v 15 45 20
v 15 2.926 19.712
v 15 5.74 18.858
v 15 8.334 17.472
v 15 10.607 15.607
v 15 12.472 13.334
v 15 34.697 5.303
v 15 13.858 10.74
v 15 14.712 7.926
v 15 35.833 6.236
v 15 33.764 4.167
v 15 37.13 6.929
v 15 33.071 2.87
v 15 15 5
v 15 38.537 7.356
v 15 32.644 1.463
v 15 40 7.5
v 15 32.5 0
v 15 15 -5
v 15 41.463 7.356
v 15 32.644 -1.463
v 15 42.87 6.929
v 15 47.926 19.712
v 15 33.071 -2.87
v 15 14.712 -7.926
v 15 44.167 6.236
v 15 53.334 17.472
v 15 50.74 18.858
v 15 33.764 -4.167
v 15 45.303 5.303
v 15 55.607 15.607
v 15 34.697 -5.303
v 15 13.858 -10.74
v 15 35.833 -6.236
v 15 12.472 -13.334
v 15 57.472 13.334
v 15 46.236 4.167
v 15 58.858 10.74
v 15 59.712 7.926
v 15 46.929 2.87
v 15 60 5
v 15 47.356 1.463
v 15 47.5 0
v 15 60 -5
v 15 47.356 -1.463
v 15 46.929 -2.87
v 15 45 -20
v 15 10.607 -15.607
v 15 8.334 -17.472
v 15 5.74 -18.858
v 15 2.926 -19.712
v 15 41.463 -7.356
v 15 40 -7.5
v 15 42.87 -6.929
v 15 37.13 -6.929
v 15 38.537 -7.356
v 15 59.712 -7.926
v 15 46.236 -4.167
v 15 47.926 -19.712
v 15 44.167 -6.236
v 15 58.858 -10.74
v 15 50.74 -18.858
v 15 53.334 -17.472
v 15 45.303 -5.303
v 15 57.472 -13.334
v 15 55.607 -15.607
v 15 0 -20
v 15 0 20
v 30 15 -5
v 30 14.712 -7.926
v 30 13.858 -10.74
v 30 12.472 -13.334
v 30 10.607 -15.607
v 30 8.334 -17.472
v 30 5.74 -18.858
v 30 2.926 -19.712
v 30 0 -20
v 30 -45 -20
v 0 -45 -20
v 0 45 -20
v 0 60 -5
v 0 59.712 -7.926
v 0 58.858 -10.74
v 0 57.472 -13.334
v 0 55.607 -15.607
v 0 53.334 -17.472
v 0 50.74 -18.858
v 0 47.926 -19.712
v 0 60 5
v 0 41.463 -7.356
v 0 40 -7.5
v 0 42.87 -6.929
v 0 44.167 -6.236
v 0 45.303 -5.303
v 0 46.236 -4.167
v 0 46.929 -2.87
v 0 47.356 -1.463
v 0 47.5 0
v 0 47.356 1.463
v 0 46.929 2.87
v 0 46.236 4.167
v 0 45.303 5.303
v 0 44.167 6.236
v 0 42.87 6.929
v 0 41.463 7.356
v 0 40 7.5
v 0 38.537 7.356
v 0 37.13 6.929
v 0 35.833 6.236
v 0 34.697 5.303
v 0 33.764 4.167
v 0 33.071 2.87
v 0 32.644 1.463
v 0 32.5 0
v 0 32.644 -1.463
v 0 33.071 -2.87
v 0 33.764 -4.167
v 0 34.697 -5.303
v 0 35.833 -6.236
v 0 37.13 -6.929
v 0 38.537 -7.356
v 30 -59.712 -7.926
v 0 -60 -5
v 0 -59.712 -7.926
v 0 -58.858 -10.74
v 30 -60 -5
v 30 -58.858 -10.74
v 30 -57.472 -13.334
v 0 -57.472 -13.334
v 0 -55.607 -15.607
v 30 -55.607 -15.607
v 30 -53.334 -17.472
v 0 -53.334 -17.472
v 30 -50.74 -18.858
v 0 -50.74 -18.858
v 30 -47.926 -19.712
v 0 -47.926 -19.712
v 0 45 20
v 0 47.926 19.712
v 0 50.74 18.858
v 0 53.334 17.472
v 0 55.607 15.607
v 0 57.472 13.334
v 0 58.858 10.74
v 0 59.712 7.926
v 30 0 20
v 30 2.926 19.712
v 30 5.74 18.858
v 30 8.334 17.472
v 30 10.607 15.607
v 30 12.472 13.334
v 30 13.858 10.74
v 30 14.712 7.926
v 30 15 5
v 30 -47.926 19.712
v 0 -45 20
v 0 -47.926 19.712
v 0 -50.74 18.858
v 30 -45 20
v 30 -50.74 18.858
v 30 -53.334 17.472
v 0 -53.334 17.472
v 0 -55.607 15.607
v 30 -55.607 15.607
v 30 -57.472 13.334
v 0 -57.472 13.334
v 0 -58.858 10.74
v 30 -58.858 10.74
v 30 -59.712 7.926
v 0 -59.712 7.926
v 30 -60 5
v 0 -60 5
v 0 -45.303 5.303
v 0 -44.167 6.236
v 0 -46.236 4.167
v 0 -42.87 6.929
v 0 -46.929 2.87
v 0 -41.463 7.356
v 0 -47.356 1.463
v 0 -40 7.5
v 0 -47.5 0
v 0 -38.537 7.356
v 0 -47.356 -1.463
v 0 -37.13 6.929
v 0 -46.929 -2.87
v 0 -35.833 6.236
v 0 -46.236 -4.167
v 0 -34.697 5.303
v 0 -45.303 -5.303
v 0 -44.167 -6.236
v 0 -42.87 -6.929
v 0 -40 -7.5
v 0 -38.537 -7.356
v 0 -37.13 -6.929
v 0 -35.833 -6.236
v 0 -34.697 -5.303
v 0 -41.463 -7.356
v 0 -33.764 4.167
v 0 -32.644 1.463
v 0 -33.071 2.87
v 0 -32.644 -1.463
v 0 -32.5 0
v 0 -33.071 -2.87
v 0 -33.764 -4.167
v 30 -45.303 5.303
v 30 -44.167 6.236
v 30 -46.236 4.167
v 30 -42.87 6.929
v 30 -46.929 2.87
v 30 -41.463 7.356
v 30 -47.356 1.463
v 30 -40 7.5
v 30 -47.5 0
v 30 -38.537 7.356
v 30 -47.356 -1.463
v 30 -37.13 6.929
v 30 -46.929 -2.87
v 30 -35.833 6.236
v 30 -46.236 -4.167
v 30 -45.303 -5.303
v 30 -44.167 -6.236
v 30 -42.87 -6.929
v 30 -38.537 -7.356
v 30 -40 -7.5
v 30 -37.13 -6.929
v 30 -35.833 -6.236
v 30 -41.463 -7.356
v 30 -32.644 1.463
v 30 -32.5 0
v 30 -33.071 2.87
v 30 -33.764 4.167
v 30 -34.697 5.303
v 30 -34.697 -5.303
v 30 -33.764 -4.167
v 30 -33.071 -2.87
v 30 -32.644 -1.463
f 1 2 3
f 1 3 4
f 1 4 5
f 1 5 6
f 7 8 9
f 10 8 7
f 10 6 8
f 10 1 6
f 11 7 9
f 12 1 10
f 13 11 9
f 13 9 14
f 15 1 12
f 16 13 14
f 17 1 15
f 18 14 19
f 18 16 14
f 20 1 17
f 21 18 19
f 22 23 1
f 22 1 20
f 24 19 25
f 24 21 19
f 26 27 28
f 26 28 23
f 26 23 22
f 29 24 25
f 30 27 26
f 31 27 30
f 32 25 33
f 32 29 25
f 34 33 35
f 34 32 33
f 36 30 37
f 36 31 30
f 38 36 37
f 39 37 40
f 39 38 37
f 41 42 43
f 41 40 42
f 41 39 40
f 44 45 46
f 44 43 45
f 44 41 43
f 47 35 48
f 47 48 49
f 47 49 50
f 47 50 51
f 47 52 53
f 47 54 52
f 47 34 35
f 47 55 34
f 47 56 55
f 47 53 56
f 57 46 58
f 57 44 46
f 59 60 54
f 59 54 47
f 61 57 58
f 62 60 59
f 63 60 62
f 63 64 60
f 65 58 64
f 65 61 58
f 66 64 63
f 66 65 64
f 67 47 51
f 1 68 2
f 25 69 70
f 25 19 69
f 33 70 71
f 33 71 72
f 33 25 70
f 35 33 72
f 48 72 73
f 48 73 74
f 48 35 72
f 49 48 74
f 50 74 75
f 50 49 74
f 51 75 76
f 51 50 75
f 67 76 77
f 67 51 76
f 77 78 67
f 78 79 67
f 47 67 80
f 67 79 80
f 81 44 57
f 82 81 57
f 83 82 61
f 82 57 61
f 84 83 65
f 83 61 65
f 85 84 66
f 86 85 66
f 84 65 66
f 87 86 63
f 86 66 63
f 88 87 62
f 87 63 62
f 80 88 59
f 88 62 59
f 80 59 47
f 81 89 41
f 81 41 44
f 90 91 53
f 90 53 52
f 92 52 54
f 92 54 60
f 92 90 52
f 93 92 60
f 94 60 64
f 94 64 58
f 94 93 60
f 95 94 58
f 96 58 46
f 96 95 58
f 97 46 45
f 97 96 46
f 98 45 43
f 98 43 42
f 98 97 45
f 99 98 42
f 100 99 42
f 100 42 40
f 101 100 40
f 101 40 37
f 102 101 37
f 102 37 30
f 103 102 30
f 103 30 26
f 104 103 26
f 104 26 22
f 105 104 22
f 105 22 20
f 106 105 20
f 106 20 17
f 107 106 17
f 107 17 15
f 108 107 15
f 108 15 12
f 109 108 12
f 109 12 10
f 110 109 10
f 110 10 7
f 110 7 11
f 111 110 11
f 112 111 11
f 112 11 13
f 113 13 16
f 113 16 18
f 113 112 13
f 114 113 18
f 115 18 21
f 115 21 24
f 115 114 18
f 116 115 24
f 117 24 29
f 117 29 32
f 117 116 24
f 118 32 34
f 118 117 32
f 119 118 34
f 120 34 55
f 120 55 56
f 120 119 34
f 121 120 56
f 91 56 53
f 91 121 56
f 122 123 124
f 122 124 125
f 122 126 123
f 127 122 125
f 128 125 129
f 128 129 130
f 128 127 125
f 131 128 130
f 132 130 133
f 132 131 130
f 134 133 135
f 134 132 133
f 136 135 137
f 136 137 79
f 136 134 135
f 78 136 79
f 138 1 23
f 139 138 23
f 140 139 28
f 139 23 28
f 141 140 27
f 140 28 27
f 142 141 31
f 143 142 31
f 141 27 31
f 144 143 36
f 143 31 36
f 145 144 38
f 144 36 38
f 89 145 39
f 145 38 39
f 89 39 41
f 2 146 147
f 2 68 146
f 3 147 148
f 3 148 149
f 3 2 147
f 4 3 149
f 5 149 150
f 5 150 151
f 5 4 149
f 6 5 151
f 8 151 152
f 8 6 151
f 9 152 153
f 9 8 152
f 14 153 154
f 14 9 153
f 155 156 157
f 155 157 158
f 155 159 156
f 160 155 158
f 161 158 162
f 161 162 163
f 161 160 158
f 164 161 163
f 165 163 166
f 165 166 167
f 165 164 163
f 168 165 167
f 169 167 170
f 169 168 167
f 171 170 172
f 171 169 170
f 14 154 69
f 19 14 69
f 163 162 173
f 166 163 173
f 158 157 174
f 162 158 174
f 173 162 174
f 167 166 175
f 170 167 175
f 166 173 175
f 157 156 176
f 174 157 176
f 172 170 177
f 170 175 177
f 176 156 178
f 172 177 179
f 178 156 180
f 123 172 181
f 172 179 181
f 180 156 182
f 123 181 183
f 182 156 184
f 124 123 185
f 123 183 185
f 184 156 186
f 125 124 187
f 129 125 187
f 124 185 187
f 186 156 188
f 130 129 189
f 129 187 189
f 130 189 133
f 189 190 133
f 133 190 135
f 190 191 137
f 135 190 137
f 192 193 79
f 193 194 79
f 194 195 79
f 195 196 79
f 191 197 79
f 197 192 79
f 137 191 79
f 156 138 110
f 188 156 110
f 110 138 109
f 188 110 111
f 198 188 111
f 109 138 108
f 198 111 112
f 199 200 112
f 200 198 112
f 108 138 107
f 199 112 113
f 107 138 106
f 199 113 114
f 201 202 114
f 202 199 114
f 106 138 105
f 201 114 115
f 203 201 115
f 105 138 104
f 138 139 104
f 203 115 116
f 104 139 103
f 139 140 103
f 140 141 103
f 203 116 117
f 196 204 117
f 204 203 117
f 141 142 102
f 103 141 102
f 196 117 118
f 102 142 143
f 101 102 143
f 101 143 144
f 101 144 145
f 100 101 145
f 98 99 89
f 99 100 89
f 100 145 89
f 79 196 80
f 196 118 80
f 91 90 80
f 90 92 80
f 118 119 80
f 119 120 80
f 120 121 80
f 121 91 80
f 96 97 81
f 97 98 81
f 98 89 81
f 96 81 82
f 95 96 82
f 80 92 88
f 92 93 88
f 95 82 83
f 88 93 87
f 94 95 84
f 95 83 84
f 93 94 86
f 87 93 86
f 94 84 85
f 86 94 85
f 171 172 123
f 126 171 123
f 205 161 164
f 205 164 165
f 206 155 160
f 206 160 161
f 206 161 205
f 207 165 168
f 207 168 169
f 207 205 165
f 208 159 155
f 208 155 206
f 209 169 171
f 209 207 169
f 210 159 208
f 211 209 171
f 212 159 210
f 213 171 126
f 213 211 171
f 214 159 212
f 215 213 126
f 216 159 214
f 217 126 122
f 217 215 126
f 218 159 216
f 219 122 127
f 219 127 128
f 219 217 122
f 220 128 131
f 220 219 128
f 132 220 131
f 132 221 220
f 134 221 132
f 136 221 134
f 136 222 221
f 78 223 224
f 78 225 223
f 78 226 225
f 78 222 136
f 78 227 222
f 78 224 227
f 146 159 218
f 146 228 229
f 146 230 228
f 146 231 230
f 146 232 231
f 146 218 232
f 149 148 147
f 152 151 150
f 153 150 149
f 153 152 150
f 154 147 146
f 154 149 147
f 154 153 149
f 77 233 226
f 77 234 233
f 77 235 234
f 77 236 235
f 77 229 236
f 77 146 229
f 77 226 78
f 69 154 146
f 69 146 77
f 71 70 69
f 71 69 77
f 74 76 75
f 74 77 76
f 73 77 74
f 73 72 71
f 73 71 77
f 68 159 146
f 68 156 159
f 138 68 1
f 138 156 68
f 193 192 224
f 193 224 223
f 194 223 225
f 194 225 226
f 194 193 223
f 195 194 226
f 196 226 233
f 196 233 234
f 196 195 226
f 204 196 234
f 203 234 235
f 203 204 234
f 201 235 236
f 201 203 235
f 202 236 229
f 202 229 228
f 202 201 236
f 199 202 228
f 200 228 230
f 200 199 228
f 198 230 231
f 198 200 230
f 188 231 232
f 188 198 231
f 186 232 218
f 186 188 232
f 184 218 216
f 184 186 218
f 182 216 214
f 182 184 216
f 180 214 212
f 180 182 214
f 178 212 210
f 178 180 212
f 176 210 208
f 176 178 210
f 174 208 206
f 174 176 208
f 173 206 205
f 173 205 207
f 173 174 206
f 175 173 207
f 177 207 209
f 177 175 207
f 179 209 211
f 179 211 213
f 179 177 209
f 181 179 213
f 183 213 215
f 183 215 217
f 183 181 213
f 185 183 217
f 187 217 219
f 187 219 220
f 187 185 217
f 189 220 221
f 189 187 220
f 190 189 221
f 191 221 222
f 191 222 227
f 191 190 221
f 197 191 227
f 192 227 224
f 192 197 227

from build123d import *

# Parameters (mm, degrees)
SKETCH1_W           = 40
SKETCH1_H           = 120
SKETCH1_R           = 7.5
BOSS_EXTRUDE1_DEPTH = 30
FILLET1_R           = 15
SKETCH2_R           = 7.5
CUT_EXTRUDE1_DEPTH  = 15
FILLET2_R           = 15


with BuildPart() as part:
    # Sketch1 → Boss-Extrude1 (new body)
    with BuildSketch(Plane(origin=(0, 0, 0), x_dir=(0, 0, -1), z_dir=(1, 0, 0))):
        Rectangle(SKETCH1_W, SKETCH1_H)
        with Locations((0, 40)):
            Circle(SKETCH1_R, mode=Mode.SUBTRACT)
        with Locations((0, -40)):
            Circle(SKETCH1_R, mode=Mode.SUBTRACT)
    extrude(amount=BOSS_EXTRUDE1_DEPTH)

    # Fillet1
    fillet1_edges = [part.edges().sort_by_distance(p)[0] for p in [
        (15, 60, 20),
        (15, 60, -20),
        (15, -60, -20),
        (15, -60, 20),
    ]]
    fillet(fillet1_edges, radius=FILLET1_R)

    # Sketch2 → Cut-Extrude1 (cut)
    with BuildSketch(Plane(origin=(30, 0, 0), x_dir=(0, 0, -1), z_dir=(1, 0, 0))):
        with BuildLine():
            Line((-20, 45), (-20, 15))
            Line((-20, 15), (20, 15))
            Line((20, 15), (20, 45))
            ThreePointArc((20, 45), (15.606601718, 55.606601718), (5, 60))
            Line((5, 60), (-5, 60))
            ThreePointArc((-5, 60), (-15.606601718, 55.606601718), (-20, 45))
        make_face()
        with Locations((0, 40)):
            Circle(SKETCH2_R, mode=Mode.SUBTRACT)
    extrude(amount=-CUT_EXTRUDE1_DEPTH, mode=Mode.SUBTRACT)

    # Fillet2
    fillet2_edges = [part.edges().sort_by_distance(p)[0] for p in [
        (22.5, 15, 20),
        (22.5, 15, -20),
    ]]
    fillet(fillet2_edges, radius=FILLET2_R)


solid = part.part
